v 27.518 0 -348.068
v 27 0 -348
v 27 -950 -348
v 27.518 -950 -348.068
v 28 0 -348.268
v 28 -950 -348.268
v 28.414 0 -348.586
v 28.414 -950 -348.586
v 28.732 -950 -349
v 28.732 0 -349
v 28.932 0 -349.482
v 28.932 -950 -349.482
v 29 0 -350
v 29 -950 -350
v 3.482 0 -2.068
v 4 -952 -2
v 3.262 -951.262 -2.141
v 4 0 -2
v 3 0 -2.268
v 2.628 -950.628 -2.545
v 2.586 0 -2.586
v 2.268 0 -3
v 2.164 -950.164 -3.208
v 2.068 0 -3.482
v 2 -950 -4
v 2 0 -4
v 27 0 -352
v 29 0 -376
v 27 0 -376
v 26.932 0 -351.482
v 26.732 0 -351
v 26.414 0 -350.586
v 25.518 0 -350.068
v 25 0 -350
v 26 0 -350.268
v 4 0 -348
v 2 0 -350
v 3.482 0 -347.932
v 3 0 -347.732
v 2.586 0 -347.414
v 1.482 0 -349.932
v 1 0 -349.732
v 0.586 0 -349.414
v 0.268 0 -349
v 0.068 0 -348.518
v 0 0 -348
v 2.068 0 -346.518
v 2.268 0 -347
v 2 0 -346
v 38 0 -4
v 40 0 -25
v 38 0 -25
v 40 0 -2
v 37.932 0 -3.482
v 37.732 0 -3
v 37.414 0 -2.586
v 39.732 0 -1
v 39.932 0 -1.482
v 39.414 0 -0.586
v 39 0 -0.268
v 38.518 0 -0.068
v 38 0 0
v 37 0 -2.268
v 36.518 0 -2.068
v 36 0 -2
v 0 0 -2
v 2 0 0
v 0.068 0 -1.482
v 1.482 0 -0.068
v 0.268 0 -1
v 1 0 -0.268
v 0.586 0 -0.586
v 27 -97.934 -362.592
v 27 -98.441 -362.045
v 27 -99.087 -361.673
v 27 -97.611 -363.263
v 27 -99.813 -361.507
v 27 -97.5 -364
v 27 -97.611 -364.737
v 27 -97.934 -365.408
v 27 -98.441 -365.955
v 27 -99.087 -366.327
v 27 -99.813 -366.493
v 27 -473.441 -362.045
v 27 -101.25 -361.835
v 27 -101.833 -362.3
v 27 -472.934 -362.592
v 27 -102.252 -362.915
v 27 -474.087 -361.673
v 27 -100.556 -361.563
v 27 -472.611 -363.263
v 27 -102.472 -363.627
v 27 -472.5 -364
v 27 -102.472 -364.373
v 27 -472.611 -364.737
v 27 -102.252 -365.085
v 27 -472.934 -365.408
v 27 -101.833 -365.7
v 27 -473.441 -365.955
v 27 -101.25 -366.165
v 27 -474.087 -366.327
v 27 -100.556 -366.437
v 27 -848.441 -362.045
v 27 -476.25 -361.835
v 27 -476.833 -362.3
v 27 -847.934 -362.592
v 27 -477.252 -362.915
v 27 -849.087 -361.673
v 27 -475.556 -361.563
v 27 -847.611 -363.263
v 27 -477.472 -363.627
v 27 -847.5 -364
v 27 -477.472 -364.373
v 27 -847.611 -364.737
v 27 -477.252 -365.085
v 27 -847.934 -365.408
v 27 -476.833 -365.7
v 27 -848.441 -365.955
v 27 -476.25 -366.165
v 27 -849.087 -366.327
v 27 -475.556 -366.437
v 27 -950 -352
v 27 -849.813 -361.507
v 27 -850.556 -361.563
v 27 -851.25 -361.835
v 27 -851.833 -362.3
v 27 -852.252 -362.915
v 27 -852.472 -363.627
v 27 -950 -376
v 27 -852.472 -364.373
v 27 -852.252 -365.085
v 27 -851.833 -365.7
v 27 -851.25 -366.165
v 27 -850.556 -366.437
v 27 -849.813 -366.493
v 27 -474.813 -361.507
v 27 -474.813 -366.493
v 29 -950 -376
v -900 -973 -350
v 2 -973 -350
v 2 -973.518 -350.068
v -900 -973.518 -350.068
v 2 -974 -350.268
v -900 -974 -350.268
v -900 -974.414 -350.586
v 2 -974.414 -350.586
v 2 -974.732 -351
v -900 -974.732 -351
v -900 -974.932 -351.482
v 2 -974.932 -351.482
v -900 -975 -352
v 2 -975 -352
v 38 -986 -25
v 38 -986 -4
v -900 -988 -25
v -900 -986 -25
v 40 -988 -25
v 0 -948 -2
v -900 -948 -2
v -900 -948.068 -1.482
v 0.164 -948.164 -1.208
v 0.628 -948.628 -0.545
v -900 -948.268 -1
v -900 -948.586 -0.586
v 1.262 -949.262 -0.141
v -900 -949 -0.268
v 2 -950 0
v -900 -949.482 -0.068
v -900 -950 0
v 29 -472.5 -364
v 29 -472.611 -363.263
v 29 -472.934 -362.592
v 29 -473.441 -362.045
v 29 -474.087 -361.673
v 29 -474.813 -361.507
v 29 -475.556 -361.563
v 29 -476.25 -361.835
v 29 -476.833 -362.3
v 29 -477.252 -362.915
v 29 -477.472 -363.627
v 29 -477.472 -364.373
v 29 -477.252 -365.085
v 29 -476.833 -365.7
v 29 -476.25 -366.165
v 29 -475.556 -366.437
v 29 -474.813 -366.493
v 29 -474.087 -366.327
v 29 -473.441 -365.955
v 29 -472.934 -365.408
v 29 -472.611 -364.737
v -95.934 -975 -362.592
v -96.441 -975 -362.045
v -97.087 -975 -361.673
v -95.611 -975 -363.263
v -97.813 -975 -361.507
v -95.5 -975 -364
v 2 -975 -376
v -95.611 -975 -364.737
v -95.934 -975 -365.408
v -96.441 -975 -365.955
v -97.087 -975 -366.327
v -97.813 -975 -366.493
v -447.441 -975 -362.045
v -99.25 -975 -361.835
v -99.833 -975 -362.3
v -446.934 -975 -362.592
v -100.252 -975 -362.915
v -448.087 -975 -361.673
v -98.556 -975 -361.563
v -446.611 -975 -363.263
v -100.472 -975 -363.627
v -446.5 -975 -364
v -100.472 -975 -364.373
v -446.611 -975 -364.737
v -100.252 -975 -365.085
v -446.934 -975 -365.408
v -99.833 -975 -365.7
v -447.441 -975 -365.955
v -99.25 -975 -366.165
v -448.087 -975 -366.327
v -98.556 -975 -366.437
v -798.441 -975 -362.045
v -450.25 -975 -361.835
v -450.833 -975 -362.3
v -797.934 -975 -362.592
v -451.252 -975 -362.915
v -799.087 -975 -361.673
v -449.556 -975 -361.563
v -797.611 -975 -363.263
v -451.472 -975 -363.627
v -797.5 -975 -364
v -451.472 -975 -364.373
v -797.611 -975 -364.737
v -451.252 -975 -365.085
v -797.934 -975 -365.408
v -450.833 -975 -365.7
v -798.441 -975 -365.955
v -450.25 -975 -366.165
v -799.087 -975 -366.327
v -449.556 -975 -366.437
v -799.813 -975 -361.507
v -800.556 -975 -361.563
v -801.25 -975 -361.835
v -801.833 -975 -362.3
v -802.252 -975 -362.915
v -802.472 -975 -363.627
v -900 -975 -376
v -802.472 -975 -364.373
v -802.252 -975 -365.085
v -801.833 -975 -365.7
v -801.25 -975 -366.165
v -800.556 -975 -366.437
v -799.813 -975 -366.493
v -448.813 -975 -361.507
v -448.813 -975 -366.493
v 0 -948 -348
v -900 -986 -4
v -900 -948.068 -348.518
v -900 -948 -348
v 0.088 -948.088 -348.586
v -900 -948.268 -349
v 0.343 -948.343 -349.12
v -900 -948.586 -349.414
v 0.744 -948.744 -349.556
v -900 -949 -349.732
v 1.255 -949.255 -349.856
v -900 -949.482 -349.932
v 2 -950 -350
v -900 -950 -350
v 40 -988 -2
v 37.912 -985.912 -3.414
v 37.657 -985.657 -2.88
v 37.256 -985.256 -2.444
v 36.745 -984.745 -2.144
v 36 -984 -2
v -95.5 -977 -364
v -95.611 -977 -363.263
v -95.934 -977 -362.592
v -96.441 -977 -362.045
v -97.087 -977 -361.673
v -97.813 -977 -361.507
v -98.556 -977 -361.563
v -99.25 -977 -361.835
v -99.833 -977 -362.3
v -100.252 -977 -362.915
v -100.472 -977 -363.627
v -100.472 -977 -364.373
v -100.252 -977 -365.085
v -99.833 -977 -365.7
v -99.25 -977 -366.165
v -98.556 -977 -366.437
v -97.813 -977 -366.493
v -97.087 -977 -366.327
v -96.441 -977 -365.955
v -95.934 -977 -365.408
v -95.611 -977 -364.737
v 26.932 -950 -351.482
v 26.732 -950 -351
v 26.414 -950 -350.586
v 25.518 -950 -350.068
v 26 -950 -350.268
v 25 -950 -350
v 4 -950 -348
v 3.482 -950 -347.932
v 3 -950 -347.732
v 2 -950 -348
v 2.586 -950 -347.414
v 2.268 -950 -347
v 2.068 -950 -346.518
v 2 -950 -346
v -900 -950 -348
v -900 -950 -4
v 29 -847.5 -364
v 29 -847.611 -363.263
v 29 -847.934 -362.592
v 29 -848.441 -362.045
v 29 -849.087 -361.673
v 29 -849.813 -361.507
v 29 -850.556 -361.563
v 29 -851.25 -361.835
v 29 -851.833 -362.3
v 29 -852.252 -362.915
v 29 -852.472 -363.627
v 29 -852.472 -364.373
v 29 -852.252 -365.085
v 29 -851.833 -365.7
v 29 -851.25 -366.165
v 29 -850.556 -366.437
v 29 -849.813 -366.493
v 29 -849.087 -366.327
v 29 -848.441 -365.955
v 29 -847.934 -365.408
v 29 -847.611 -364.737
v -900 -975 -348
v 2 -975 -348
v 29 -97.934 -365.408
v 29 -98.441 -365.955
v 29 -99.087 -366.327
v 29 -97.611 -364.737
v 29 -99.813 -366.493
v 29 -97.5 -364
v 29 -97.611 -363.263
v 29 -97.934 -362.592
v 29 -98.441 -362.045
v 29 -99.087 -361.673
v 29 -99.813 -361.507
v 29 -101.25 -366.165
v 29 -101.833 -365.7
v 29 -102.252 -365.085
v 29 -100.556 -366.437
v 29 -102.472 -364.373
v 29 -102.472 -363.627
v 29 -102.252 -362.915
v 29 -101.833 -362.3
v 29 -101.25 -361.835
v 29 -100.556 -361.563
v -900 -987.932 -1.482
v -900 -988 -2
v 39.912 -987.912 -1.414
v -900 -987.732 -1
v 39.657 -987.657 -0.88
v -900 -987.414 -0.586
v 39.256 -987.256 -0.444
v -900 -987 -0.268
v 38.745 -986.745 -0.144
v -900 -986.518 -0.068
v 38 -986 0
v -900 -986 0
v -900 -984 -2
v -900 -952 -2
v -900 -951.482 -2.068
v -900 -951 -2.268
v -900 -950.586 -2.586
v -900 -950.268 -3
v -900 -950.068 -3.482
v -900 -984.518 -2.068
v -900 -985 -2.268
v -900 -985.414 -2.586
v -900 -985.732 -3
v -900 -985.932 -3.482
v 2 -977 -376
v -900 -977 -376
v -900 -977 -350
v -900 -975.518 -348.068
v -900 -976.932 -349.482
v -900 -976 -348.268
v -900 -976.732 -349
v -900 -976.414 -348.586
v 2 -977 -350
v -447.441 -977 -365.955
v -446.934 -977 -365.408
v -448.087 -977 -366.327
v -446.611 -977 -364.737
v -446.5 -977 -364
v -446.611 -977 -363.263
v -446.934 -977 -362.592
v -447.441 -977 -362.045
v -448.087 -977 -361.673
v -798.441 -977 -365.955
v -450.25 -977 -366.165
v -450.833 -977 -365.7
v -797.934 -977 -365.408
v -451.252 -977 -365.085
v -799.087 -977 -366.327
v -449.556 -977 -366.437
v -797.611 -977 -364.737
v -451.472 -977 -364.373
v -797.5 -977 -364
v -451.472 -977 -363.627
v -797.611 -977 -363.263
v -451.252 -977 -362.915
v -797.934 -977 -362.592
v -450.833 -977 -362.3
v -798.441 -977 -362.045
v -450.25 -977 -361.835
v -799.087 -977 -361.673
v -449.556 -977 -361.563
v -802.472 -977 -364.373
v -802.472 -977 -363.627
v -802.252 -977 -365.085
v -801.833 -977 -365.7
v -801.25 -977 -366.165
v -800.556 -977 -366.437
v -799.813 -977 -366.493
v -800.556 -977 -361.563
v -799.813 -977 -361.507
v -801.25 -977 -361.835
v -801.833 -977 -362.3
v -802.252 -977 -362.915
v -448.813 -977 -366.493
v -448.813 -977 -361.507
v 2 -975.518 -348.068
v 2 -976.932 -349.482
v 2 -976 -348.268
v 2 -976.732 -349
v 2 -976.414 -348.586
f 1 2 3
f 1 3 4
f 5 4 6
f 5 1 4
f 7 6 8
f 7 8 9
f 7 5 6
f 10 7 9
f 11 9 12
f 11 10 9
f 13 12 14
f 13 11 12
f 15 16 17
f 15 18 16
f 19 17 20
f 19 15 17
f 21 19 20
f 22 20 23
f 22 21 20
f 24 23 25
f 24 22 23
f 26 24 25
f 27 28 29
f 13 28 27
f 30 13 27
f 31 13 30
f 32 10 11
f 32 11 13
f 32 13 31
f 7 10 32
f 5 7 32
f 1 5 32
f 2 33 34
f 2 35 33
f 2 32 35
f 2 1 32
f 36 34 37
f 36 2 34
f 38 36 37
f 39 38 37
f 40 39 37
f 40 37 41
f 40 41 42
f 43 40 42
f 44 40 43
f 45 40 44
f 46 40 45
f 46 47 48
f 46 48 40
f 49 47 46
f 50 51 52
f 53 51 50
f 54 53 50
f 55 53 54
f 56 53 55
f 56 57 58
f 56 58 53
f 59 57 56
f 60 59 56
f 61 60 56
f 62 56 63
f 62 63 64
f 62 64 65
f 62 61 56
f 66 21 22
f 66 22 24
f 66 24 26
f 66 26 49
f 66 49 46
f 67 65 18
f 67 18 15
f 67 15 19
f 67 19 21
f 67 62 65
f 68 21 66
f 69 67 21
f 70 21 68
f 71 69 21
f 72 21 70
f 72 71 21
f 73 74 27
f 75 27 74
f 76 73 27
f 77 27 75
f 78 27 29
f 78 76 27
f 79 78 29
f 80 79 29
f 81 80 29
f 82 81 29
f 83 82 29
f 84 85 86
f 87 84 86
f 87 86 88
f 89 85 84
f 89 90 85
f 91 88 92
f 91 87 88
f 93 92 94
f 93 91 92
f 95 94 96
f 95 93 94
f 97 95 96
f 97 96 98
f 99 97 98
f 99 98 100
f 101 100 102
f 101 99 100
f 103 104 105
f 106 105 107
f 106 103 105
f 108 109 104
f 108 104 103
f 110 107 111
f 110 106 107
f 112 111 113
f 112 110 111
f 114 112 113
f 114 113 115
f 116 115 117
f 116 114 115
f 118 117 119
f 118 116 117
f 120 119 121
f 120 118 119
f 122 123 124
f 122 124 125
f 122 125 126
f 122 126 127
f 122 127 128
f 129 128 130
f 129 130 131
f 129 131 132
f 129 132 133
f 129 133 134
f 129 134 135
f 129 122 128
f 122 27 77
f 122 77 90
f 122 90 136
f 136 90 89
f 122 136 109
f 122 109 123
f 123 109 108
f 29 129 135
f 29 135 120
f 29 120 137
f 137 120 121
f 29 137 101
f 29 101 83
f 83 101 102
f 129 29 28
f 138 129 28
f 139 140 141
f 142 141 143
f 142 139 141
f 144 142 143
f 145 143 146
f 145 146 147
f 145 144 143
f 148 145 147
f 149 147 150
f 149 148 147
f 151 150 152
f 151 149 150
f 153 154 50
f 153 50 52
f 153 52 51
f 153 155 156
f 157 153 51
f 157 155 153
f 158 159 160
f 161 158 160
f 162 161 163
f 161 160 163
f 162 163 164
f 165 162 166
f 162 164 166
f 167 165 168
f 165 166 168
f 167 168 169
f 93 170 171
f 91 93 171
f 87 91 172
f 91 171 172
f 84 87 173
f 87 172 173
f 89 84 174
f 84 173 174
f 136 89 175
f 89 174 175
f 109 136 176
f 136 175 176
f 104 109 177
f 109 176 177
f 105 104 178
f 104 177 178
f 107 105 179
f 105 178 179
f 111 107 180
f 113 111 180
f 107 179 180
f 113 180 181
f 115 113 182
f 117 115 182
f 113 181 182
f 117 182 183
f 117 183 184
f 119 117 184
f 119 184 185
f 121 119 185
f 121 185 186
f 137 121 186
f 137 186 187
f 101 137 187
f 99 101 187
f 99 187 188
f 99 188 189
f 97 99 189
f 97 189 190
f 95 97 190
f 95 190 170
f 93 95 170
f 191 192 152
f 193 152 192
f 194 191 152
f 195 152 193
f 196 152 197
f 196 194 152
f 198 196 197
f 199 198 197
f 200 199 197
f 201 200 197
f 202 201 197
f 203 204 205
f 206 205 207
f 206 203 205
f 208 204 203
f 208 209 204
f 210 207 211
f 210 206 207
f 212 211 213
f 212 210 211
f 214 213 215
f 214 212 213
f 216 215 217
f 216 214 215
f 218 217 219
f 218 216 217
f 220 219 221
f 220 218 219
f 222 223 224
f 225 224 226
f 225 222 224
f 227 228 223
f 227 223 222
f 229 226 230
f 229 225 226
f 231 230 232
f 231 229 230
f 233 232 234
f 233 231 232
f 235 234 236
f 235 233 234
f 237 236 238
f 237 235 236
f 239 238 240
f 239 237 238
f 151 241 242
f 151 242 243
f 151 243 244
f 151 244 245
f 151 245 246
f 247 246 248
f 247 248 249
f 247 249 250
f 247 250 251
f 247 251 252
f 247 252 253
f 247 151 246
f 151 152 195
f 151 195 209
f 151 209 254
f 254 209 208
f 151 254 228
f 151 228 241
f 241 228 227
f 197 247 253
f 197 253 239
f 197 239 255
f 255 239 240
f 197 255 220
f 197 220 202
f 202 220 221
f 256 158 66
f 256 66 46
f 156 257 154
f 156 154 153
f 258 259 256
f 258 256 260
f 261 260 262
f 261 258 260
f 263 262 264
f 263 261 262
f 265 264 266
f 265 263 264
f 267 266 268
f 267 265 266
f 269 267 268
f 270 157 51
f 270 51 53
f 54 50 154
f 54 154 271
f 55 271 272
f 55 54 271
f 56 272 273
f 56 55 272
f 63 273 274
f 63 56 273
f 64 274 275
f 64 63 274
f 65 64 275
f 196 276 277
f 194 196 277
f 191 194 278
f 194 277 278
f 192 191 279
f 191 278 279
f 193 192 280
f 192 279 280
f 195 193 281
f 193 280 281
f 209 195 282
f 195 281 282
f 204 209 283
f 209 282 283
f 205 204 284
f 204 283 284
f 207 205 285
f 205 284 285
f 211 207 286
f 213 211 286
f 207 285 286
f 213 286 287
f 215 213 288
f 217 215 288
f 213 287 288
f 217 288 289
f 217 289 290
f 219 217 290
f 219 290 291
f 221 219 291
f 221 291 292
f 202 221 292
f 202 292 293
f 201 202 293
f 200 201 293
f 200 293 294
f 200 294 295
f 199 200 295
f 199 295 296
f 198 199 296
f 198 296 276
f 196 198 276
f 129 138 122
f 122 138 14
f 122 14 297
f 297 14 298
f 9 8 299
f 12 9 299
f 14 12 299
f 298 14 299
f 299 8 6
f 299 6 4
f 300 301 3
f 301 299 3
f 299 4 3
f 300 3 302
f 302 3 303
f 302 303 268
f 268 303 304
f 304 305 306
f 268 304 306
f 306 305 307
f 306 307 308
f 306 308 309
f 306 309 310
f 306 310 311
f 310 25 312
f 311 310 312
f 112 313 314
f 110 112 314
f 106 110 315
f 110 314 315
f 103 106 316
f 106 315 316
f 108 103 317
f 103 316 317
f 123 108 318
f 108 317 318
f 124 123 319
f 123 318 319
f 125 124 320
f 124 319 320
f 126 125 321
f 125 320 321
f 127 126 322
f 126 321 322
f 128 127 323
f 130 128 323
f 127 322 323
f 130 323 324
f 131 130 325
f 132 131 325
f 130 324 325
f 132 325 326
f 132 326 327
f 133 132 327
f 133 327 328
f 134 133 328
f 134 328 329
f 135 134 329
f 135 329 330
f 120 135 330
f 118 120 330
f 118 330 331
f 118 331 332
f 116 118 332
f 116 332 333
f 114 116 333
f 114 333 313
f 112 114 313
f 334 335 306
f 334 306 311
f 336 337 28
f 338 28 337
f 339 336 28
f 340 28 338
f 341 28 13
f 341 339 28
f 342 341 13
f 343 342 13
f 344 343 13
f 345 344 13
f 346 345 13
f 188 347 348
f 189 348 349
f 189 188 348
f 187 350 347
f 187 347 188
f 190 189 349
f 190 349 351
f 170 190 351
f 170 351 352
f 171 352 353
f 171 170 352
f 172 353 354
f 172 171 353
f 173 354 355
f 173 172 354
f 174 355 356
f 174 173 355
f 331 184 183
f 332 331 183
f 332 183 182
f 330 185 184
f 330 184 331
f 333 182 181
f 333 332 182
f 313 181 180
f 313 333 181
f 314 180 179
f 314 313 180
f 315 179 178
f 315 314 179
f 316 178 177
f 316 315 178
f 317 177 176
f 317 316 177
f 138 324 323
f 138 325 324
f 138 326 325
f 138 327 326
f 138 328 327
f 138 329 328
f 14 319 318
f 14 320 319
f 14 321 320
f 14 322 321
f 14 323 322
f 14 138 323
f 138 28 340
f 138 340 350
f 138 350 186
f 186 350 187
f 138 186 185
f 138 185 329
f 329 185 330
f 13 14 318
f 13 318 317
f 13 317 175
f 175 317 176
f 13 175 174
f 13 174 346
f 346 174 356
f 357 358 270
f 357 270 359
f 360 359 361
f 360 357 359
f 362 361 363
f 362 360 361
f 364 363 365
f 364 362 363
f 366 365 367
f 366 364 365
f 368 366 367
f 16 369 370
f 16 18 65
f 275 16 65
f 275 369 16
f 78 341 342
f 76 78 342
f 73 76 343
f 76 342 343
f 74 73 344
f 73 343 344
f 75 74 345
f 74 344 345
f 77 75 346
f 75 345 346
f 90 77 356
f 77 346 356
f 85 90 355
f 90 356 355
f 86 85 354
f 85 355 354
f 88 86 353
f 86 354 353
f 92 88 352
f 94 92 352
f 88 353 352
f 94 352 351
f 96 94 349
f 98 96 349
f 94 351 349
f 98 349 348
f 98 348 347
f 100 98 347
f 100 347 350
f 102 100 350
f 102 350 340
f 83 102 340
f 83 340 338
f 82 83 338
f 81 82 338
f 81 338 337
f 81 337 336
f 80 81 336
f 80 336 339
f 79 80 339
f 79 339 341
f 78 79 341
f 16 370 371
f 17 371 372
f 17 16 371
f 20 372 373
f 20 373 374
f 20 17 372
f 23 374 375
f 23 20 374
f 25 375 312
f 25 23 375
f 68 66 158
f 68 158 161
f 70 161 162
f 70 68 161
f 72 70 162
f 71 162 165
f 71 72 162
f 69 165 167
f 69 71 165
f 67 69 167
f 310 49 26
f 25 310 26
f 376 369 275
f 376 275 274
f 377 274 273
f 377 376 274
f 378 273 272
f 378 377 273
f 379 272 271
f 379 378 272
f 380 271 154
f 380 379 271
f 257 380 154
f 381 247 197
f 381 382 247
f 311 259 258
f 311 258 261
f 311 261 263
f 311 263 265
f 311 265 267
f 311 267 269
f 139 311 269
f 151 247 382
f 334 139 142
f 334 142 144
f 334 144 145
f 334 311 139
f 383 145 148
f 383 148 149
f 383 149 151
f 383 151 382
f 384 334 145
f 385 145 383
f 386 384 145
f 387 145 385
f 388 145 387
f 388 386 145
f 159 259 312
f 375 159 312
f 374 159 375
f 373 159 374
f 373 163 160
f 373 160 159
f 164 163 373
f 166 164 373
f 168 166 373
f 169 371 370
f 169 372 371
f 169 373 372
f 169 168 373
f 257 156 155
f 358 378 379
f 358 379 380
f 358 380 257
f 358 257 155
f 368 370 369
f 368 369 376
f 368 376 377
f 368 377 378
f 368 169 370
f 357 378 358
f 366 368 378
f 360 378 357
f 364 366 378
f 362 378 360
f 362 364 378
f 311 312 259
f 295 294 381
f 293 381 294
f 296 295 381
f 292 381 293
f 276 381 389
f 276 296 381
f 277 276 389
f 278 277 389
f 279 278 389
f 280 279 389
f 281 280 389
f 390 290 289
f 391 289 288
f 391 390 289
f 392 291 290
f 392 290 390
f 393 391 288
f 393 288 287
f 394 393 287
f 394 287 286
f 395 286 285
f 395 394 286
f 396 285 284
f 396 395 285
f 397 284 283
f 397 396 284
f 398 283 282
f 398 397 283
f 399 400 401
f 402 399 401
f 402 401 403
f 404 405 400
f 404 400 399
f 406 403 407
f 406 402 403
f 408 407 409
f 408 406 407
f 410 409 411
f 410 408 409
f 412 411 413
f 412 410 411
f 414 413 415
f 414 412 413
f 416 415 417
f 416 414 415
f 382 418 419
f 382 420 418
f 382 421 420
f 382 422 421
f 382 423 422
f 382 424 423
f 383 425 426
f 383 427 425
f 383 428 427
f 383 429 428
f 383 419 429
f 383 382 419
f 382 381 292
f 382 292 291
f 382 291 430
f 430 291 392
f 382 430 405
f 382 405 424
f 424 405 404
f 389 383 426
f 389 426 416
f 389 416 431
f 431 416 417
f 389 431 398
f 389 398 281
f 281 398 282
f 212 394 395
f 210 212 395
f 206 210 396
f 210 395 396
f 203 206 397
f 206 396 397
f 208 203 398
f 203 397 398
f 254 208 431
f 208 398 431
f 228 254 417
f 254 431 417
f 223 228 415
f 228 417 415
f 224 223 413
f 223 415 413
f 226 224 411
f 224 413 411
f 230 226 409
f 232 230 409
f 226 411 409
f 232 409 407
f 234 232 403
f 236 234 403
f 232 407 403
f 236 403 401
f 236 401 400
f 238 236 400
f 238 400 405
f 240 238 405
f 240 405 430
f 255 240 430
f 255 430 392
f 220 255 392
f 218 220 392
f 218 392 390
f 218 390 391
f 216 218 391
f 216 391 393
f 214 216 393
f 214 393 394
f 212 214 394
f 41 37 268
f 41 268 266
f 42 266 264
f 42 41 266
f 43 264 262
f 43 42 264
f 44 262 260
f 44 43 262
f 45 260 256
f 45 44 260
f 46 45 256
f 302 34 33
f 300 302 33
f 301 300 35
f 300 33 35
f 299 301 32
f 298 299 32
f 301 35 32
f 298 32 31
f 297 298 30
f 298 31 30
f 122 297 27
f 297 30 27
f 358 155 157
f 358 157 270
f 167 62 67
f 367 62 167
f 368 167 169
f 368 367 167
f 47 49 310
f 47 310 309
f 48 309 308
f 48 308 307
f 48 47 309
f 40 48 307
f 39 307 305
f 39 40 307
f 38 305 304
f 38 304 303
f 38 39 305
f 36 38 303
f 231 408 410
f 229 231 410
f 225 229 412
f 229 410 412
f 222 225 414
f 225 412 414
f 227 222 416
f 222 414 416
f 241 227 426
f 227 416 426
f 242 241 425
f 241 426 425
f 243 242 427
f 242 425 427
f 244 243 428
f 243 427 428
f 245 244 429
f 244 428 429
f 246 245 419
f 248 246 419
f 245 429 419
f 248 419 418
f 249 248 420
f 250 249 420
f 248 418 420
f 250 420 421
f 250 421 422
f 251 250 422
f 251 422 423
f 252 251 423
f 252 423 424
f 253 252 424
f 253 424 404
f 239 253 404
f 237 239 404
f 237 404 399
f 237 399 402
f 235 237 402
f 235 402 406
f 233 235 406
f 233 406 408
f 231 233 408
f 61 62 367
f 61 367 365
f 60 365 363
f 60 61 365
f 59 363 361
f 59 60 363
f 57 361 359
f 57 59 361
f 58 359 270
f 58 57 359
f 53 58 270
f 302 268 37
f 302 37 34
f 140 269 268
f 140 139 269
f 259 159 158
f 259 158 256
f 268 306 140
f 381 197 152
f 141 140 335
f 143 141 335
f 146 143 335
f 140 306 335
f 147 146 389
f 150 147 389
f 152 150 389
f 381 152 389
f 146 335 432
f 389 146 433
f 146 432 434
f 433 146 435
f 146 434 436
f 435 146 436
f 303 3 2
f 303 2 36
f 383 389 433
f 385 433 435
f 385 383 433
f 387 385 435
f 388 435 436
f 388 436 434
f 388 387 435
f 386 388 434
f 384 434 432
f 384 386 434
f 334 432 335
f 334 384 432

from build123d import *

# Parameters (mm, degrees)
F3_W         = 27
F3_H         = 27
F4_DEPTH     = 30
F5_T1_DEPTH  = 950
F5_T3_DEPTH  = 986
F5_T5_DEPTH  = 902
F5_T7_DEPTH  = 938
F5_T13_DEPTH = 955
F5_T17_DEPTH = 907
F5_T20_DEPTH = 960
F5_T22_DEPTH = 998
F5_T24_DEPTH = 953
F5_T26_DEPTH = 950
F5_T28_DEPTH = 905
F5_T30_DEPTH = 912
F5_T36_DEPTH = 910
F5_T40_DEPTH = 958
F5_T47_DEPTH = 910
F5_T51_DEPTH = 958
F8_D         = 5
F8_ON_F6_D   = 5


# Not quite as in the source:
# - a fillet or chamfer that OpenCascade refuses, or shapes differently, is made with other operations: its cross-section is extruded or revolved along the edge and cut away or added


with BuildPart() as f2:
    # F2: sweep along a path in F1
    with BuildLine(Plane.XY) as f2_path:
        Line((0, 0), (0, -948))
        Line((0, -948), (-900, -948))
    # F0 (on Front) → F2 (sweep)
    with BuildSketch(Plane.XZ):
        Polygon((38, -2), (38, -25), (40, -25), (40, 0), (0, 0), (0, -350), (27, -350), (27, -376), (29, -376), (29, -348), (2, -348), (2, -2), align=None)
    sweep(path=f2_path.line, transition=Transition.RIGHT)

    # F3 (on face) → F4 (cut)
    with BuildSketch(Plane.XY.offset(-348)):
        with Locations((15.5, -963.5)):
            Rectangle(F3_W, F3_H)
    extrude(amount=-F4_DEPTH, mode=Mode.SUBTRACT)

    # F5: fillet of radius 2 on 15 edges, made by hand

    # F5_s2 → F5_t1 (join)
    with BuildSketch(Plane.XZ):
        with BuildLine():
            ThreePointArc((2, -346), (2.5857864376, -347.4142135624), (4, -348))
            Line((4, -348), (2, -348))
            Line((2, -348), (2, -346))
        make_face()
        with BuildLine():
            ThreePointArc((25, -350), (26.4142135624, -350.5857864376), (27, -352))
            Line((27, -352), (27, -350))
            Line((27, -350), (25, -350))
        make_face()
        with BuildLine():
            ThreePointArc((4, -2), (2.5857864376, -2.5857864376), (2, -4))
            Line((2, -4), (2, -2))
            Line((2, -2), (4, -2))
        make_face()
    extrude(amount=F5_T1_DEPTH)

    # F5_s4 → F5_t3 (join)
    with BuildSketch(Plane.XZ):
        with BuildLine():
            ThreePointArc((38, -4), (37.4142135624, -2.5857864376), (36, -2))
            Line((36, -2), (38, -2))
            Line((38, -2), (38, -4))
        make_face()
    extrude(amount=F5_T3_DEPTH)

    # F5_s6 → F5_t5 (join)
    with BuildSketch(Plane.YZ.offset(-900)):
        with BuildLine():
            ThreePointArc((-973, -350), (-974.4142135624, -350.5857864376), (-975, -352))
            Line((-975, -352), (-975, -350))
            Line((-975, -350), (-973, -350))
        make_face()
        with BuildLine():
            ThreePointArc((-952, -2), (-950.5857864376, -2.5857864376), (-950, -4))
            Line((-950, -4), (-950, -2))
            Line((-950, -2), (-952, -2))
        make_face()
    extrude(amount=F5_T5_DEPTH)

    # F5_s8 → F5_t7 (join)
    with BuildSketch(Plane.YZ.offset(-900)):
        with BuildLine():
            ThreePointArc((-984, -2), (-985.4142135624, -2.5857864376), (-986, -4))
            Line((-986, -4), (-986, -2))
            Line((-986, -2), (-984, -2))
        make_face()
    extrude(amount=F5_T7_DEPTH)


with BuildPart() as f5_tool11:
    # F5_s12 → F5_t13 (new body)
    with BuildSketch(Plane.XZ):
        with BuildLine():
            ThreePointArc((4, -2), (2.5857864376, -2.5857864376), (2, -4))
            Line((2, -4), (2, -2))
            Line((2, -2), (4, -2))
        make_face()
    extrude(amount=F5_T13_DEPTH)

    split(bisect_by=Plane.XZ.offset(950), keep=Keep.TOP)


with BuildPart() as f5_tool15:
    # F5_s16 → F5_t17 (new body)
    with BuildSketch(Plane.YZ.offset(7)):
        with BuildLine():
            ThreePointArc((-952, -2), (-950.5857864376, -2.5857864376), (-950, -4))
            Line((-950, -4), (-950, -2))
            Line((-950, -2), (-952, -2))
        make_face()
    extrude(amount=-F5_T17_DEPTH)

    split(bisect_by=Plane.YZ.offset(2), keep=Keep.TOP)


with BuildPart() as f5_tool11_1:
    add(f5_tool11.part)

    # F5_t19: intersect F5_tool15
    add(f5_tool15.part, mode=Mode.INTERSECT)


with BuildPart() as f2_1:
    add(f2.part)

    # F5_t9: union F5_tool11
    add(f5_tool11_1.part)

    # F5_s21 → F5_t20 (cut)
    with BuildSketch(Plane.XZ.offset(-5)):
        with BuildLine():
            ThreePointArc((27, -348), (28.4142135624, -348.5857864376), (29, -350))
            Line((29, -350), (29, -348))
            Line((29, -348), (27, -348))
        make_face()
    extrude(amount=F5_T20_DEPTH, mode=Mode.SUBTRACT)

    # F5_s23 → F5_t22 (cut)
    with BuildSketch(Plane.XZ.offset(-5)):
        with BuildLine():
            ThreePointArc((38, 0), (39.4142135624, -0.5857864376), (40, -2))
            Line((40, -2), (40, 0))
            Line((40, 0), (38, 0))
        make_face()
    extrude(amount=F5_T22_DEPTH, mode=Mode.SUBTRACT)

    # F5_s25 → F5_t24 (cut)
    with BuildSketch(Plane.XZ.offset(-5)):
        with BuildLine():
            ThreePointArc((0, -2), (0.5857864376, -0.5857864376), (2, 0))
            Line((2, 0), (0, 0))
            Line((0, 0), (0, -2))
        make_face()
        with BuildLine():
            ThreePointArc((2, -350), (0.5857864376, -349.4142135624), (0, -348))
            Line((0, -348), (0, -350))
            Line((0, -350), (2, -350))
        make_face()
    extrude(amount=F5_T24_DEPTH, mode=Mode.SUBTRACT)

    # F5_s27 → F5_t26 (cut)
    with BuildSketch(Plane.YZ.offset(-905)):
        with BuildLine():
            ThreePointArc((-988, -2), (-987.4142135624, -0.5857864376), (-986, 0))
            Line((-986, 0), (-988, 0))
            Line((-988, 0), (-988, -2))
        make_face()
    extrude(amount=F5_T26_DEPTH, mode=Mode.SUBTRACT)

    # F5_s29 → F5_t28 (cut)
    with BuildSketch(Plane.YZ.offset(-905)):
        with BuildLine():
            ThreePointArc((-948, -2), (-948.5857864376, -0.5857864376), (-950, 0))
            Line((-950, 0), (-948, 0))
            Line((-948, 0), (-948, -2))
        make_face()
        with BuildLine():
            ThreePointArc((-948, -348), (-948.5857864376, -349.4142135624), (-950, -350))
            Line((-950, -350), (-948, -350))
            Line((-948, -350), (-948, -348))
        make_face()
    extrude(amount=F5_T28_DEPTH, mode=Mode.SUBTRACT)

    # F5_s31 → F5_t30 (cut)
    with BuildSketch(Plane.YZ.offset(-905)):
        with BuildLine():
            ThreePointArc((-977, -350), (-976.4142135624, -348.5857864376), (-975, -348))
            Line((-975, -348), (-977, -348))
            Line((-977, -348), (-977, -350))
        make_face()
    extrude(amount=F5_T30_DEPTH, mode=Mode.SUBTRACT)


with BuildPart() as f5_tool34:
    # F5_s35 → F5_t36 (new body)
    with BuildSketch(Plane.YZ.offset(5)):
        with BuildLine():
            ThreePointArc((-948, -2), (-948.5857864376, -0.5857864376), (-950, 0))
            Line((-950, 0), (-948, 0))
            Line((-948, 0), (-948, -2))
        make_face()
    extrude(amount=-F5_T36_DEPTH)

    split(bisect_by=Plane.YZ, keep=Keep.TOP)


with BuildPart() as f5_tool38:
    # F5_s39 → F5_t40 (new body)
    with BuildSketch(Plane.XZ.offset(-5)):
        with BuildLine():
            ThreePointArc((0, -2), (0.5857864376, -0.5857864376), (2, 0))
            Line((2, 0), (0, 0))
            Line((0, 0), (0, -2))
        make_face()
    extrude(amount=F5_T40_DEPTH)

    split(bisect_by=Plane.XZ.offset(948), keep=Keep.TOP)


with BuildPart() as f5_tool34_1:
    add(f5_tool34.part)

    # F5_t42: intersect F5_tool38
    add(f5_tool38.part, mode=Mode.INTERSECT)


with BuildPart() as f2_2:
    add(f2_1.part)

    # F5_t32: cut F5_tool34
    add(f5_tool34_1.part, mode=Mode.SUBTRACT)


with BuildPart() as f5_tool45:
    # F5_s46 → F5_t47 (new body)
    with BuildSketch(Plane.YZ.offset(5)):
        with BuildLine():
            ThreePointArc((-948, -348), (-948.5857864376, -349.4142135624), (-950, -350))
            Line((-950, -350), (-948, -350))
            Line((-948, -350), (-948, -348))
        make_face()
    extrude(amount=-F5_T47_DEPTH)

    split(bisect_by=Plane.YZ, keep=Keep.TOP)


with BuildPart() as f5_tool49:
    # F5_s50 → F5_t51 (new body)
    with BuildSketch(Plane.XZ.offset(-5)):
        with BuildLine():
            ThreePointArc((2, -350), (0.5857864376, -349.4142135624), (0, -348))
            Line((0, -348), (0, -350))
            Line((0, -350), (2, -350))
        make_face()
    extrude(amount=F5_T51_DEPTH)

    split(bisect_by=Plane.XZ.offset(948), keep=Keep.TOP)


with BuildPart() as f5_tool45_1:
    add(f5_tool45.part)

    # F5_t53: intersect F5_tool49
    add(f5_tool49.part, mode=Mode.INTERSECT)


with BuildPart() as f2_3:
    add(f2_2.part)

    # F5_t43: cut F5_tool45
    add(f5_tool45_1.part, mode=Mode.SUBTRACT)

    # F8 (through all)
    with Locations(Plane(origin=(0, -975, 0), x_dir=(-1, 0, 0), z_dir=(0, 1, 0))):
        with Locations((98, -364), (449, -364), (800, -364)):
            Hole(F8_D / 2)

    # F8 on F6 (through all)
    with Locations(Plane(origin=(27, 0, 0), x_dir=(0, -1, 0), z_dir=(-1, 0, 0))):
        with Locations((100, -364), (475, -364), (850, -364)):
            Hole(F8_ON_F6_D / 2)


solid = f2_3.part
